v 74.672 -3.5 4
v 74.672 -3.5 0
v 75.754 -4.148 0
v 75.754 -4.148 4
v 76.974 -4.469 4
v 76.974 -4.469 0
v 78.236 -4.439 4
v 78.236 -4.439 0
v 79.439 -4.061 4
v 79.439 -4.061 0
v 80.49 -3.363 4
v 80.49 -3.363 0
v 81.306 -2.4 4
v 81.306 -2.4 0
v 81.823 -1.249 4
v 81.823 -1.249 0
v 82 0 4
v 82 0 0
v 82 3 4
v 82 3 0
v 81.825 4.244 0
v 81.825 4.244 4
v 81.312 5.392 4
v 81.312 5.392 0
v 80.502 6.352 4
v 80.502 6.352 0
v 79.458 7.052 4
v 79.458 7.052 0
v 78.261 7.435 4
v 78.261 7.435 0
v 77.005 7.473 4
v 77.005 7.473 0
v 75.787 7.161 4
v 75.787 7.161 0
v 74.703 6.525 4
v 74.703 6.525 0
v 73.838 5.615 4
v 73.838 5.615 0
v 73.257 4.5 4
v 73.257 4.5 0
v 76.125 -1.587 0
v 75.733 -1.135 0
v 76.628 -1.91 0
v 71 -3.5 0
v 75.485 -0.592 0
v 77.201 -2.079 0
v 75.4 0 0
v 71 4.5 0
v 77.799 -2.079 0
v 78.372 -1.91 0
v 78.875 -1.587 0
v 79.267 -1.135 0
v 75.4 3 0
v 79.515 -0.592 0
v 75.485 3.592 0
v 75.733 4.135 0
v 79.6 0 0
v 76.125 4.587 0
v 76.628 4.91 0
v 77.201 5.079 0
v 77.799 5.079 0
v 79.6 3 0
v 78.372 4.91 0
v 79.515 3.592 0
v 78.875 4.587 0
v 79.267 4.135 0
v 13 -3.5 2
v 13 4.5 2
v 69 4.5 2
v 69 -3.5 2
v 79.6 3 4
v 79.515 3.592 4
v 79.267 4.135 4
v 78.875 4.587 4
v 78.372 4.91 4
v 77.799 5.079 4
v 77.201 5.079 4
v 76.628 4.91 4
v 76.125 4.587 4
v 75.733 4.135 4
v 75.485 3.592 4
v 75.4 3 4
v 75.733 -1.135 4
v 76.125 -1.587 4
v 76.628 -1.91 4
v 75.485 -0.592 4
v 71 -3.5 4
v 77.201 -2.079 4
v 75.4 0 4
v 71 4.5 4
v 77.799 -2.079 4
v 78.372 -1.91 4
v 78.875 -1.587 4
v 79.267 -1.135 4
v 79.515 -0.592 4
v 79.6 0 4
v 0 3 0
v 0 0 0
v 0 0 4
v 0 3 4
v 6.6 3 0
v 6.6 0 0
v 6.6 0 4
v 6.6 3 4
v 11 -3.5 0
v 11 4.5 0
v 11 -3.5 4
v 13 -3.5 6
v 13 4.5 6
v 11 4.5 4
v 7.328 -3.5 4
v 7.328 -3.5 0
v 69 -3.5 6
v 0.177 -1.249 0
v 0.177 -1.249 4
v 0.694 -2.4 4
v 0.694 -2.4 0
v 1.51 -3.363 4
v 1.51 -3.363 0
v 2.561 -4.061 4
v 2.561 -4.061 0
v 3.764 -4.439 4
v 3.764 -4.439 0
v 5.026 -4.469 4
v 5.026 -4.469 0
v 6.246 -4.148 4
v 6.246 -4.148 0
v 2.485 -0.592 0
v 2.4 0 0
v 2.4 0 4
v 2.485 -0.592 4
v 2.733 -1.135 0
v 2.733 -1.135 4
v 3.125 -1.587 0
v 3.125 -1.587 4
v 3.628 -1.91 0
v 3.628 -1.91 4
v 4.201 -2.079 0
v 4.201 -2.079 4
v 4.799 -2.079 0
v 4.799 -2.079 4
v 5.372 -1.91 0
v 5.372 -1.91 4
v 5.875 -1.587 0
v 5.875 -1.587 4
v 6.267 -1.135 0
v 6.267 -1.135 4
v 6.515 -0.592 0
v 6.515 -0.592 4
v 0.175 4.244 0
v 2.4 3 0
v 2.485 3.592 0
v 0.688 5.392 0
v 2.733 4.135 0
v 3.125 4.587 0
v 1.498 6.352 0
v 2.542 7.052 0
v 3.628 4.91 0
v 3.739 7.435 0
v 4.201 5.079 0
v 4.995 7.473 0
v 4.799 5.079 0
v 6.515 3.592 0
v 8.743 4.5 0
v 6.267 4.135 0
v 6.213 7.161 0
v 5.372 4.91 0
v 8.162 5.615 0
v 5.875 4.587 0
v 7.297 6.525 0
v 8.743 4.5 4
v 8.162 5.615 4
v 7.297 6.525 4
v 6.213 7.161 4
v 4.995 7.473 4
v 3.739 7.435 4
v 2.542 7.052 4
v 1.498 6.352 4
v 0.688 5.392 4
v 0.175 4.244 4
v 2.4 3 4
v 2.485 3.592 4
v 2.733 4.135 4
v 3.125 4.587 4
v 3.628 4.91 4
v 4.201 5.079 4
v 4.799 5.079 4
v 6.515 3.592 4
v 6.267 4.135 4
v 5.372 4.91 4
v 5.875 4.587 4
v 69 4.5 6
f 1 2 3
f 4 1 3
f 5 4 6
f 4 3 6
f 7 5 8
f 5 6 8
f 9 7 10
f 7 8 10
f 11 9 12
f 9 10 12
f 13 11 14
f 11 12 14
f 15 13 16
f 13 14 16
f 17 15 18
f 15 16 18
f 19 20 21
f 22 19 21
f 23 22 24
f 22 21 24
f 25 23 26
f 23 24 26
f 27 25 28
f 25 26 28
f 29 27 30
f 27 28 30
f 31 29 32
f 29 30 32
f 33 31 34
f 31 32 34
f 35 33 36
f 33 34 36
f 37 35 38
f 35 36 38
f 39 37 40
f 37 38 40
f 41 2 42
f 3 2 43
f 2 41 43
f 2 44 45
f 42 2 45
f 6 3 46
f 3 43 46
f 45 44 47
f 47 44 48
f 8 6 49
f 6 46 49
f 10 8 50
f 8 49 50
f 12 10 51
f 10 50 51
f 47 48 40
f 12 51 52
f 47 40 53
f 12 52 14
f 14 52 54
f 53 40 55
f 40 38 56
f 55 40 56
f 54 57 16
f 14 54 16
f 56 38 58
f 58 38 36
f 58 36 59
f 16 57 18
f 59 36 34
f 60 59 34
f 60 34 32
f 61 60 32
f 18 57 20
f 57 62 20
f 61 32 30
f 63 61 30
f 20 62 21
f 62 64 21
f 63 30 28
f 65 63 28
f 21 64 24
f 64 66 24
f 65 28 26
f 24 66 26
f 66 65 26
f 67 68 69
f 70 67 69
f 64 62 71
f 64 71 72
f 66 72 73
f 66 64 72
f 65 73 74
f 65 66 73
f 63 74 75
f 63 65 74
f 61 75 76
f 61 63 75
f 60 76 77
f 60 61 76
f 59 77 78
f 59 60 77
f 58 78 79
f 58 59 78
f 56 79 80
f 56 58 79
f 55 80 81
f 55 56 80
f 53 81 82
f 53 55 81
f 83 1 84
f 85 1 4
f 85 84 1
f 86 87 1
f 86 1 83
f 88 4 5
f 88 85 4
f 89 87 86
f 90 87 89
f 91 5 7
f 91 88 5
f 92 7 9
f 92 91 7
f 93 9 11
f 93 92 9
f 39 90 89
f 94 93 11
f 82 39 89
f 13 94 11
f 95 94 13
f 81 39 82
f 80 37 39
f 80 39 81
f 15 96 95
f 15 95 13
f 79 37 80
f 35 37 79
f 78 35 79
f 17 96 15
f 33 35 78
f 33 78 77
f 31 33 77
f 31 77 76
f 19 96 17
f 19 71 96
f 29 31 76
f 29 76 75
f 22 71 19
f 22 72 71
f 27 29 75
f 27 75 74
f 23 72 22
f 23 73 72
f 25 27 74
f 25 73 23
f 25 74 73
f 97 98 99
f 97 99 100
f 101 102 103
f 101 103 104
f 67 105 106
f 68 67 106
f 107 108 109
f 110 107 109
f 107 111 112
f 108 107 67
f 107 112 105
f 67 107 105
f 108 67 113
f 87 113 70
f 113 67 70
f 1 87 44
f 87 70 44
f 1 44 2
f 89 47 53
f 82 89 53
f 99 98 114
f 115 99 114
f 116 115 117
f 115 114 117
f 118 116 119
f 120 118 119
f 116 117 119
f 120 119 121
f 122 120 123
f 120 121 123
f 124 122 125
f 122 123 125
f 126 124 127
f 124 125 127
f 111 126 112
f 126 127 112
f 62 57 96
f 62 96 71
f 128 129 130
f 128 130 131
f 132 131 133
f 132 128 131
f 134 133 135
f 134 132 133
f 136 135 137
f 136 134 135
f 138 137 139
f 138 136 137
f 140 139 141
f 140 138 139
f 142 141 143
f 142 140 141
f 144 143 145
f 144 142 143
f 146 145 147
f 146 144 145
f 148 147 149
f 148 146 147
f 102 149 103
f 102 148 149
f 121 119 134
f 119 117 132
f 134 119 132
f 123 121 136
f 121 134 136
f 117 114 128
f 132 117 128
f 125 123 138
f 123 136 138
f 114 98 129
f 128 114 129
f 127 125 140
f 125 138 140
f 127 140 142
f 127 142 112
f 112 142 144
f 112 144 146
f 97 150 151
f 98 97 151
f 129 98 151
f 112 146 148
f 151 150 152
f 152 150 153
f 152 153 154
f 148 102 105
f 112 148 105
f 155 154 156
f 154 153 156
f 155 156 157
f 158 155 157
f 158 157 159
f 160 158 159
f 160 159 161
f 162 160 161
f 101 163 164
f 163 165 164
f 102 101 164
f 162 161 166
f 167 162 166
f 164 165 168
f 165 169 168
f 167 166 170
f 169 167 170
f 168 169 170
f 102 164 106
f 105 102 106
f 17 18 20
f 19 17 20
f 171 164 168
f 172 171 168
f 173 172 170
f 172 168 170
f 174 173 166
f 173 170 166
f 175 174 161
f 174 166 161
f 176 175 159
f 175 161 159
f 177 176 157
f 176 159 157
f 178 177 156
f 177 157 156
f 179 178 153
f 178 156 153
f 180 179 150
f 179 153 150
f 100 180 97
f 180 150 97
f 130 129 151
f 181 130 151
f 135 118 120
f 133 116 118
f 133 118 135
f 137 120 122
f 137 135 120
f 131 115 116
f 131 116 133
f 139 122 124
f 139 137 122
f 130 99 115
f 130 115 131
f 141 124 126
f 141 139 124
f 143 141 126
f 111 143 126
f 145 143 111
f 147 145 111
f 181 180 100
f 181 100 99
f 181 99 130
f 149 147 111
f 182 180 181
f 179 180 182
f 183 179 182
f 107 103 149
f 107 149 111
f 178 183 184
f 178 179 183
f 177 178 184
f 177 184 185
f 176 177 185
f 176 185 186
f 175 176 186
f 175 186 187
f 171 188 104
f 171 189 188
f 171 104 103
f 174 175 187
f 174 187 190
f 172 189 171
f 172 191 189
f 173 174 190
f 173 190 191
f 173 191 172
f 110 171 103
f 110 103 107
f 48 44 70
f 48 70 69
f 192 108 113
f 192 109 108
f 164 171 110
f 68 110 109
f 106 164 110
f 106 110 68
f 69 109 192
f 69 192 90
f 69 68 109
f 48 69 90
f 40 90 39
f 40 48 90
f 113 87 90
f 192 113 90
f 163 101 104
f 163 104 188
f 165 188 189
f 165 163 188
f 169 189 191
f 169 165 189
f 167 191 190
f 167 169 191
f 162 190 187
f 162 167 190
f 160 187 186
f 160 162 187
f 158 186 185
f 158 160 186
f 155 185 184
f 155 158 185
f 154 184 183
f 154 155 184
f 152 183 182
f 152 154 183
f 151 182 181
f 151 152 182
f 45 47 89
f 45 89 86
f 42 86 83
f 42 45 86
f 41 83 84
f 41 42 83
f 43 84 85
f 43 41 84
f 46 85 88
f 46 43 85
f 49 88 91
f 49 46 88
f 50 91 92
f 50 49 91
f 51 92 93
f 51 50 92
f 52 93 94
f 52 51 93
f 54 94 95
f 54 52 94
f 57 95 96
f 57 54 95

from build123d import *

# Parameters (mm, degrees)
BOX002_W          = 4.2
BOX002_H          = 3
BOX002_DEPTH      = 4
CYLINDER005_R     = 2.1
CYLINDER005_DEPTH = 4
CYLINDER004_R     = 2.1
CYLINDER004_DEPTH = 4
BOX003_W          = 9
BOX003_H          = 3
BOX003_DEPTH      = 4
CYLINDER006_R     = 4.5
CYLINDER006_DEPTH = 4
CYLINDER007_R     = 4.5
CYLINDER007_DEPTH = 4
BOX005_W          = 6
BOX005_H          = 8
BOX005_DEPTH      = 4
CHAMFER002_SIZE   = 2
BOX006_W          = 60
BOX006_H          = 8
BOX006_DEPTH      = 4
CHAMFER_SIZE      = 2
CHAMFER003_SIZE   = 2
BOX004_W          = 6
BOX004_H          = 8
BOX004_DEPTH      = 4
CHAMFER001_SIZE   = 2
BOX_W             = 4.2
BOX_H             = 3
BOX_DEPTH         = 4
CYLINDER001_R     = 2.1
CYLINDER001_DEPTH = 4
CYLINDER_R        = 2.1
CYLINDER_DEPTH    = 4
BOX001_W          = 9
BOX001_H          = 3
BOX001_DEPTH      = 4
CYLINDER003_R     = 4.5
CYLINDER003_DEPTH = 4
CYLINDER002_R     = 4.5
CYLINDER002_DEPTH = 4


with BuildPart() as w_rfel002:
    # Box002 → Box002 (new body)
    with BuildSketch(Plane(origin=(-2.1, 0, 0), x_dir=(1, 0, 0), z_dir=(0, 0, 1))):
        with Locations((2.1, 1.5)):
            Rectangle(BOX002_W, BOX002_H)
    extrude(amount=BOX002_DEPTH)


with BuildPart() as zylinder005:
    # Cylinder005 → Cylinder005 (new body)
    with BuildSketch(Plane(origin=(0, 3, 0), x_dir=(1, 0, 0), z_dir=(0, 0, 1))):
        Circle(CYLINDER005_R)
    extrude(amount=CYLINDER005_DEPTH)


with BuildPart() as fusion002:
    # Cylinder004 → Cylinder004 (new body)
    with BuildSketch(Plane.XY):
        Circle(CYLINDER004_R)
    extrude(amount=CYLINDER004_DEPTH)

    # Fusion002: union Würfel002, Zylinder005
    add(w_rfel002.part)
    add(zylinder005.part)


with BuildPart() as w_rfel003:
    # Box003 → Box003 (new body)
    with BuildSketch(Plane(origin=(-4.5, 0, 0), x_dir=(1, 0, 0), z_dir=(0, 0, 1))):
        with Locations((4.5, 1.5)):
            Rectangle(BOX003_W, BOX003_H)
    extrude(amount=BOX003_DEPTH)


with BuildPart() as zylinder006:
    # Cylinder006 → Cylinder006 (new body)
    with BuildSketch(Plane(origin=(0, 3, 0), x_dir=(1, 0, 0), z_dir=(0, 0, 1))):
        Circle(CYLINDER006_R)
    extrude(amount=CYLINDER006_DEPTH)


with BuildPart() as cut001:
    # Cylinder007 → Cylinder007 (new body)
    with BuildSketch(Plane.XY):
        Circle(CYLINDER007_R)
    extrude(amount=CYLINDER007_DEPTH)

    # Fusion003: union Würfel003, Zylinder006
    add(w_rfel003.part)
    add(zylinder006.part)

    # Cut001: cut Fusion002
    add(fusion002.part, mode=Mode.SUBTRACT)


with BuildPart() as cut001_1:
    # Cut001 placement: moved
    add(cut001.part.moved(Location((77.5, 0, 0))))


with BuildPart() as chamfer002:
    # Box005 → Box005 (new body)
    with BuildSketch(Plane(origin=(69, -3.5, 0), x_dir=(1, 0, 0), z_dir=(0, 0, 1))):
        with Locations((3, 4)):
            Rectangle(BOX005_W, BOX005_H)
    extrude(amount=BOX005_DEPTH)

    # Chamfer002
    chamfer002_edges = [chamfer002.edges().sort_by_distance(p)[0] for p in [
        (69, 0.5, 0),
    ]]
    chamfer(chamfer002_edges, length=CHAMFER002_SIZE)


with BuildPart() as chamfer003:
    # Box006 → Box006 (new body)
    with BuildSketch(Plane(origin=(11, -3.5, 2), x_dir=(1, 0, 0), z_dir=(0, 0, 1))):
        with Locations((30, 4)):
            Rectangle(BOX006_W, BOX006_H)
    extrude(amount=BOX006_DEPTH)

    # Chamfer
    chamfer_edges = [chamfer003.edges().sort_by_distance(p)[0] for p in [
        (11, 0.5, 6),
    ]]
    chamfer(chamfer_edges, length=CHAMFER_SIZE)

    # Chamfer003
    chamfer003_edges = [chamfer003.edges().sort_by_distance(p)[0] for p in [
        (71, 0.5, 6),
    ]]
    chamfer(chamfer003_edges, length=CHAMFER003_SIZE)


with BuildPart() as fusion004:
    # Box004 → Box004 (new body)
    with BuildSketch(Plane(origin=(7, -3.5, 0), x_dir=(1, 0, 0), z_dir=(0, 0, 1))):
        with Locations((3, 4)):
            Rectangle(BOX004_W, BOX004_H)
    extrude(amount=BOX004_DEPTH)

    # Chamfer001
    chamfer001_edges = [fusion004.edges().sort_by_distance(p)[0] for p in [
        (13, 0.5, 0),
    ]]
    chamfer(chamfer001_edges, length=CHAMFER001_SIZE)

    # Fusion004: union Chamfer002, Chamfer003
    add(chamfer002.part)
    add(chamfer003.part)


with BuildPart() as w_rfel:
    # Box → Box (new body)
    with BuildSketch(Plane(origin=(-2.1, 0, 0), x_dir=(1, 0, 0), z_dir=(0, 0, 1))):
        with Locations((2.1, 1.5)):
            Rectangle(BOX_W, BOX_H)
    extrude(amount=BOX_DEPTH)


with BuildPart() as zylinder001:
    # Cylinder001 → Cylinder001 (new body)
    with BuildSketch(Plane(origin=(0, 3, 0), x_dir=(1, 0, 0), z_dir=(0, 0, 1))):
        Circle(CYLINDER001_R)
    extrude(amount=CYLINDER001_DEPTH)


with BuildPart() as fusion:
    # Cylinder → Cylinder (new body)
    with BuildSketch(Plane.XY):
        Circle(CYLINDER_R)
    extrude(amount=CYLINDER_DEPTH)

    # Fusion: union Würfel, Zylinder001
    add(w_rfel.part)
    add(zylinder001.part)


with BuildPart() as w_rfel001:
    # Box001 → Box001 (new body)
    with BuildSketch(Plane(origin=(-4.5, 0, 0), x_dir=(1, 0, 0), z_dir=(0, 0, 1))):
        with Locations((4.5, 1.5)):
            Rectangle(BOX001_W, BOX001_H)
    extrude(amount=BOX001_DEPTH)


with BuildPart() as zylinder003:
    # Cylinder003 → Cylinder003 (new body)
    with BuildSketch(Plane(origin=(0, 3, 0), x_dir=(1, 0, 0), z_dir=(0, 0, 1))):
        Circle(CYLINDER003_R)
    extrude(amount=CYLINDER003_DEPTH)


with BuildPart() as fusion005:
    # Cylinder002 → Cylinder002 (new body)
    with BuildSketch(Plane.XY):
        Circle(CYLINDER002_R)
    extrude(amount=CYLINDER002_DEPTH)

    # Fusion001: union Würfel001, Zylinder003
    add(w_rfel001.part)
    add(zylinder003.part)

    # Cut: cut Fusion
    add(fusion.part, mode=Mode.SUBTRACT)


with BuildPart() as fusion005_1:
    # Cut placement: moved
    add(fusion005.part.moved(Location((4.5, 0, 0))))

    # Fusion005: union Cut001, Fusion004
    add(cut001_1.part)
    add(fusion004.part)


solid = fusion005_1.part
